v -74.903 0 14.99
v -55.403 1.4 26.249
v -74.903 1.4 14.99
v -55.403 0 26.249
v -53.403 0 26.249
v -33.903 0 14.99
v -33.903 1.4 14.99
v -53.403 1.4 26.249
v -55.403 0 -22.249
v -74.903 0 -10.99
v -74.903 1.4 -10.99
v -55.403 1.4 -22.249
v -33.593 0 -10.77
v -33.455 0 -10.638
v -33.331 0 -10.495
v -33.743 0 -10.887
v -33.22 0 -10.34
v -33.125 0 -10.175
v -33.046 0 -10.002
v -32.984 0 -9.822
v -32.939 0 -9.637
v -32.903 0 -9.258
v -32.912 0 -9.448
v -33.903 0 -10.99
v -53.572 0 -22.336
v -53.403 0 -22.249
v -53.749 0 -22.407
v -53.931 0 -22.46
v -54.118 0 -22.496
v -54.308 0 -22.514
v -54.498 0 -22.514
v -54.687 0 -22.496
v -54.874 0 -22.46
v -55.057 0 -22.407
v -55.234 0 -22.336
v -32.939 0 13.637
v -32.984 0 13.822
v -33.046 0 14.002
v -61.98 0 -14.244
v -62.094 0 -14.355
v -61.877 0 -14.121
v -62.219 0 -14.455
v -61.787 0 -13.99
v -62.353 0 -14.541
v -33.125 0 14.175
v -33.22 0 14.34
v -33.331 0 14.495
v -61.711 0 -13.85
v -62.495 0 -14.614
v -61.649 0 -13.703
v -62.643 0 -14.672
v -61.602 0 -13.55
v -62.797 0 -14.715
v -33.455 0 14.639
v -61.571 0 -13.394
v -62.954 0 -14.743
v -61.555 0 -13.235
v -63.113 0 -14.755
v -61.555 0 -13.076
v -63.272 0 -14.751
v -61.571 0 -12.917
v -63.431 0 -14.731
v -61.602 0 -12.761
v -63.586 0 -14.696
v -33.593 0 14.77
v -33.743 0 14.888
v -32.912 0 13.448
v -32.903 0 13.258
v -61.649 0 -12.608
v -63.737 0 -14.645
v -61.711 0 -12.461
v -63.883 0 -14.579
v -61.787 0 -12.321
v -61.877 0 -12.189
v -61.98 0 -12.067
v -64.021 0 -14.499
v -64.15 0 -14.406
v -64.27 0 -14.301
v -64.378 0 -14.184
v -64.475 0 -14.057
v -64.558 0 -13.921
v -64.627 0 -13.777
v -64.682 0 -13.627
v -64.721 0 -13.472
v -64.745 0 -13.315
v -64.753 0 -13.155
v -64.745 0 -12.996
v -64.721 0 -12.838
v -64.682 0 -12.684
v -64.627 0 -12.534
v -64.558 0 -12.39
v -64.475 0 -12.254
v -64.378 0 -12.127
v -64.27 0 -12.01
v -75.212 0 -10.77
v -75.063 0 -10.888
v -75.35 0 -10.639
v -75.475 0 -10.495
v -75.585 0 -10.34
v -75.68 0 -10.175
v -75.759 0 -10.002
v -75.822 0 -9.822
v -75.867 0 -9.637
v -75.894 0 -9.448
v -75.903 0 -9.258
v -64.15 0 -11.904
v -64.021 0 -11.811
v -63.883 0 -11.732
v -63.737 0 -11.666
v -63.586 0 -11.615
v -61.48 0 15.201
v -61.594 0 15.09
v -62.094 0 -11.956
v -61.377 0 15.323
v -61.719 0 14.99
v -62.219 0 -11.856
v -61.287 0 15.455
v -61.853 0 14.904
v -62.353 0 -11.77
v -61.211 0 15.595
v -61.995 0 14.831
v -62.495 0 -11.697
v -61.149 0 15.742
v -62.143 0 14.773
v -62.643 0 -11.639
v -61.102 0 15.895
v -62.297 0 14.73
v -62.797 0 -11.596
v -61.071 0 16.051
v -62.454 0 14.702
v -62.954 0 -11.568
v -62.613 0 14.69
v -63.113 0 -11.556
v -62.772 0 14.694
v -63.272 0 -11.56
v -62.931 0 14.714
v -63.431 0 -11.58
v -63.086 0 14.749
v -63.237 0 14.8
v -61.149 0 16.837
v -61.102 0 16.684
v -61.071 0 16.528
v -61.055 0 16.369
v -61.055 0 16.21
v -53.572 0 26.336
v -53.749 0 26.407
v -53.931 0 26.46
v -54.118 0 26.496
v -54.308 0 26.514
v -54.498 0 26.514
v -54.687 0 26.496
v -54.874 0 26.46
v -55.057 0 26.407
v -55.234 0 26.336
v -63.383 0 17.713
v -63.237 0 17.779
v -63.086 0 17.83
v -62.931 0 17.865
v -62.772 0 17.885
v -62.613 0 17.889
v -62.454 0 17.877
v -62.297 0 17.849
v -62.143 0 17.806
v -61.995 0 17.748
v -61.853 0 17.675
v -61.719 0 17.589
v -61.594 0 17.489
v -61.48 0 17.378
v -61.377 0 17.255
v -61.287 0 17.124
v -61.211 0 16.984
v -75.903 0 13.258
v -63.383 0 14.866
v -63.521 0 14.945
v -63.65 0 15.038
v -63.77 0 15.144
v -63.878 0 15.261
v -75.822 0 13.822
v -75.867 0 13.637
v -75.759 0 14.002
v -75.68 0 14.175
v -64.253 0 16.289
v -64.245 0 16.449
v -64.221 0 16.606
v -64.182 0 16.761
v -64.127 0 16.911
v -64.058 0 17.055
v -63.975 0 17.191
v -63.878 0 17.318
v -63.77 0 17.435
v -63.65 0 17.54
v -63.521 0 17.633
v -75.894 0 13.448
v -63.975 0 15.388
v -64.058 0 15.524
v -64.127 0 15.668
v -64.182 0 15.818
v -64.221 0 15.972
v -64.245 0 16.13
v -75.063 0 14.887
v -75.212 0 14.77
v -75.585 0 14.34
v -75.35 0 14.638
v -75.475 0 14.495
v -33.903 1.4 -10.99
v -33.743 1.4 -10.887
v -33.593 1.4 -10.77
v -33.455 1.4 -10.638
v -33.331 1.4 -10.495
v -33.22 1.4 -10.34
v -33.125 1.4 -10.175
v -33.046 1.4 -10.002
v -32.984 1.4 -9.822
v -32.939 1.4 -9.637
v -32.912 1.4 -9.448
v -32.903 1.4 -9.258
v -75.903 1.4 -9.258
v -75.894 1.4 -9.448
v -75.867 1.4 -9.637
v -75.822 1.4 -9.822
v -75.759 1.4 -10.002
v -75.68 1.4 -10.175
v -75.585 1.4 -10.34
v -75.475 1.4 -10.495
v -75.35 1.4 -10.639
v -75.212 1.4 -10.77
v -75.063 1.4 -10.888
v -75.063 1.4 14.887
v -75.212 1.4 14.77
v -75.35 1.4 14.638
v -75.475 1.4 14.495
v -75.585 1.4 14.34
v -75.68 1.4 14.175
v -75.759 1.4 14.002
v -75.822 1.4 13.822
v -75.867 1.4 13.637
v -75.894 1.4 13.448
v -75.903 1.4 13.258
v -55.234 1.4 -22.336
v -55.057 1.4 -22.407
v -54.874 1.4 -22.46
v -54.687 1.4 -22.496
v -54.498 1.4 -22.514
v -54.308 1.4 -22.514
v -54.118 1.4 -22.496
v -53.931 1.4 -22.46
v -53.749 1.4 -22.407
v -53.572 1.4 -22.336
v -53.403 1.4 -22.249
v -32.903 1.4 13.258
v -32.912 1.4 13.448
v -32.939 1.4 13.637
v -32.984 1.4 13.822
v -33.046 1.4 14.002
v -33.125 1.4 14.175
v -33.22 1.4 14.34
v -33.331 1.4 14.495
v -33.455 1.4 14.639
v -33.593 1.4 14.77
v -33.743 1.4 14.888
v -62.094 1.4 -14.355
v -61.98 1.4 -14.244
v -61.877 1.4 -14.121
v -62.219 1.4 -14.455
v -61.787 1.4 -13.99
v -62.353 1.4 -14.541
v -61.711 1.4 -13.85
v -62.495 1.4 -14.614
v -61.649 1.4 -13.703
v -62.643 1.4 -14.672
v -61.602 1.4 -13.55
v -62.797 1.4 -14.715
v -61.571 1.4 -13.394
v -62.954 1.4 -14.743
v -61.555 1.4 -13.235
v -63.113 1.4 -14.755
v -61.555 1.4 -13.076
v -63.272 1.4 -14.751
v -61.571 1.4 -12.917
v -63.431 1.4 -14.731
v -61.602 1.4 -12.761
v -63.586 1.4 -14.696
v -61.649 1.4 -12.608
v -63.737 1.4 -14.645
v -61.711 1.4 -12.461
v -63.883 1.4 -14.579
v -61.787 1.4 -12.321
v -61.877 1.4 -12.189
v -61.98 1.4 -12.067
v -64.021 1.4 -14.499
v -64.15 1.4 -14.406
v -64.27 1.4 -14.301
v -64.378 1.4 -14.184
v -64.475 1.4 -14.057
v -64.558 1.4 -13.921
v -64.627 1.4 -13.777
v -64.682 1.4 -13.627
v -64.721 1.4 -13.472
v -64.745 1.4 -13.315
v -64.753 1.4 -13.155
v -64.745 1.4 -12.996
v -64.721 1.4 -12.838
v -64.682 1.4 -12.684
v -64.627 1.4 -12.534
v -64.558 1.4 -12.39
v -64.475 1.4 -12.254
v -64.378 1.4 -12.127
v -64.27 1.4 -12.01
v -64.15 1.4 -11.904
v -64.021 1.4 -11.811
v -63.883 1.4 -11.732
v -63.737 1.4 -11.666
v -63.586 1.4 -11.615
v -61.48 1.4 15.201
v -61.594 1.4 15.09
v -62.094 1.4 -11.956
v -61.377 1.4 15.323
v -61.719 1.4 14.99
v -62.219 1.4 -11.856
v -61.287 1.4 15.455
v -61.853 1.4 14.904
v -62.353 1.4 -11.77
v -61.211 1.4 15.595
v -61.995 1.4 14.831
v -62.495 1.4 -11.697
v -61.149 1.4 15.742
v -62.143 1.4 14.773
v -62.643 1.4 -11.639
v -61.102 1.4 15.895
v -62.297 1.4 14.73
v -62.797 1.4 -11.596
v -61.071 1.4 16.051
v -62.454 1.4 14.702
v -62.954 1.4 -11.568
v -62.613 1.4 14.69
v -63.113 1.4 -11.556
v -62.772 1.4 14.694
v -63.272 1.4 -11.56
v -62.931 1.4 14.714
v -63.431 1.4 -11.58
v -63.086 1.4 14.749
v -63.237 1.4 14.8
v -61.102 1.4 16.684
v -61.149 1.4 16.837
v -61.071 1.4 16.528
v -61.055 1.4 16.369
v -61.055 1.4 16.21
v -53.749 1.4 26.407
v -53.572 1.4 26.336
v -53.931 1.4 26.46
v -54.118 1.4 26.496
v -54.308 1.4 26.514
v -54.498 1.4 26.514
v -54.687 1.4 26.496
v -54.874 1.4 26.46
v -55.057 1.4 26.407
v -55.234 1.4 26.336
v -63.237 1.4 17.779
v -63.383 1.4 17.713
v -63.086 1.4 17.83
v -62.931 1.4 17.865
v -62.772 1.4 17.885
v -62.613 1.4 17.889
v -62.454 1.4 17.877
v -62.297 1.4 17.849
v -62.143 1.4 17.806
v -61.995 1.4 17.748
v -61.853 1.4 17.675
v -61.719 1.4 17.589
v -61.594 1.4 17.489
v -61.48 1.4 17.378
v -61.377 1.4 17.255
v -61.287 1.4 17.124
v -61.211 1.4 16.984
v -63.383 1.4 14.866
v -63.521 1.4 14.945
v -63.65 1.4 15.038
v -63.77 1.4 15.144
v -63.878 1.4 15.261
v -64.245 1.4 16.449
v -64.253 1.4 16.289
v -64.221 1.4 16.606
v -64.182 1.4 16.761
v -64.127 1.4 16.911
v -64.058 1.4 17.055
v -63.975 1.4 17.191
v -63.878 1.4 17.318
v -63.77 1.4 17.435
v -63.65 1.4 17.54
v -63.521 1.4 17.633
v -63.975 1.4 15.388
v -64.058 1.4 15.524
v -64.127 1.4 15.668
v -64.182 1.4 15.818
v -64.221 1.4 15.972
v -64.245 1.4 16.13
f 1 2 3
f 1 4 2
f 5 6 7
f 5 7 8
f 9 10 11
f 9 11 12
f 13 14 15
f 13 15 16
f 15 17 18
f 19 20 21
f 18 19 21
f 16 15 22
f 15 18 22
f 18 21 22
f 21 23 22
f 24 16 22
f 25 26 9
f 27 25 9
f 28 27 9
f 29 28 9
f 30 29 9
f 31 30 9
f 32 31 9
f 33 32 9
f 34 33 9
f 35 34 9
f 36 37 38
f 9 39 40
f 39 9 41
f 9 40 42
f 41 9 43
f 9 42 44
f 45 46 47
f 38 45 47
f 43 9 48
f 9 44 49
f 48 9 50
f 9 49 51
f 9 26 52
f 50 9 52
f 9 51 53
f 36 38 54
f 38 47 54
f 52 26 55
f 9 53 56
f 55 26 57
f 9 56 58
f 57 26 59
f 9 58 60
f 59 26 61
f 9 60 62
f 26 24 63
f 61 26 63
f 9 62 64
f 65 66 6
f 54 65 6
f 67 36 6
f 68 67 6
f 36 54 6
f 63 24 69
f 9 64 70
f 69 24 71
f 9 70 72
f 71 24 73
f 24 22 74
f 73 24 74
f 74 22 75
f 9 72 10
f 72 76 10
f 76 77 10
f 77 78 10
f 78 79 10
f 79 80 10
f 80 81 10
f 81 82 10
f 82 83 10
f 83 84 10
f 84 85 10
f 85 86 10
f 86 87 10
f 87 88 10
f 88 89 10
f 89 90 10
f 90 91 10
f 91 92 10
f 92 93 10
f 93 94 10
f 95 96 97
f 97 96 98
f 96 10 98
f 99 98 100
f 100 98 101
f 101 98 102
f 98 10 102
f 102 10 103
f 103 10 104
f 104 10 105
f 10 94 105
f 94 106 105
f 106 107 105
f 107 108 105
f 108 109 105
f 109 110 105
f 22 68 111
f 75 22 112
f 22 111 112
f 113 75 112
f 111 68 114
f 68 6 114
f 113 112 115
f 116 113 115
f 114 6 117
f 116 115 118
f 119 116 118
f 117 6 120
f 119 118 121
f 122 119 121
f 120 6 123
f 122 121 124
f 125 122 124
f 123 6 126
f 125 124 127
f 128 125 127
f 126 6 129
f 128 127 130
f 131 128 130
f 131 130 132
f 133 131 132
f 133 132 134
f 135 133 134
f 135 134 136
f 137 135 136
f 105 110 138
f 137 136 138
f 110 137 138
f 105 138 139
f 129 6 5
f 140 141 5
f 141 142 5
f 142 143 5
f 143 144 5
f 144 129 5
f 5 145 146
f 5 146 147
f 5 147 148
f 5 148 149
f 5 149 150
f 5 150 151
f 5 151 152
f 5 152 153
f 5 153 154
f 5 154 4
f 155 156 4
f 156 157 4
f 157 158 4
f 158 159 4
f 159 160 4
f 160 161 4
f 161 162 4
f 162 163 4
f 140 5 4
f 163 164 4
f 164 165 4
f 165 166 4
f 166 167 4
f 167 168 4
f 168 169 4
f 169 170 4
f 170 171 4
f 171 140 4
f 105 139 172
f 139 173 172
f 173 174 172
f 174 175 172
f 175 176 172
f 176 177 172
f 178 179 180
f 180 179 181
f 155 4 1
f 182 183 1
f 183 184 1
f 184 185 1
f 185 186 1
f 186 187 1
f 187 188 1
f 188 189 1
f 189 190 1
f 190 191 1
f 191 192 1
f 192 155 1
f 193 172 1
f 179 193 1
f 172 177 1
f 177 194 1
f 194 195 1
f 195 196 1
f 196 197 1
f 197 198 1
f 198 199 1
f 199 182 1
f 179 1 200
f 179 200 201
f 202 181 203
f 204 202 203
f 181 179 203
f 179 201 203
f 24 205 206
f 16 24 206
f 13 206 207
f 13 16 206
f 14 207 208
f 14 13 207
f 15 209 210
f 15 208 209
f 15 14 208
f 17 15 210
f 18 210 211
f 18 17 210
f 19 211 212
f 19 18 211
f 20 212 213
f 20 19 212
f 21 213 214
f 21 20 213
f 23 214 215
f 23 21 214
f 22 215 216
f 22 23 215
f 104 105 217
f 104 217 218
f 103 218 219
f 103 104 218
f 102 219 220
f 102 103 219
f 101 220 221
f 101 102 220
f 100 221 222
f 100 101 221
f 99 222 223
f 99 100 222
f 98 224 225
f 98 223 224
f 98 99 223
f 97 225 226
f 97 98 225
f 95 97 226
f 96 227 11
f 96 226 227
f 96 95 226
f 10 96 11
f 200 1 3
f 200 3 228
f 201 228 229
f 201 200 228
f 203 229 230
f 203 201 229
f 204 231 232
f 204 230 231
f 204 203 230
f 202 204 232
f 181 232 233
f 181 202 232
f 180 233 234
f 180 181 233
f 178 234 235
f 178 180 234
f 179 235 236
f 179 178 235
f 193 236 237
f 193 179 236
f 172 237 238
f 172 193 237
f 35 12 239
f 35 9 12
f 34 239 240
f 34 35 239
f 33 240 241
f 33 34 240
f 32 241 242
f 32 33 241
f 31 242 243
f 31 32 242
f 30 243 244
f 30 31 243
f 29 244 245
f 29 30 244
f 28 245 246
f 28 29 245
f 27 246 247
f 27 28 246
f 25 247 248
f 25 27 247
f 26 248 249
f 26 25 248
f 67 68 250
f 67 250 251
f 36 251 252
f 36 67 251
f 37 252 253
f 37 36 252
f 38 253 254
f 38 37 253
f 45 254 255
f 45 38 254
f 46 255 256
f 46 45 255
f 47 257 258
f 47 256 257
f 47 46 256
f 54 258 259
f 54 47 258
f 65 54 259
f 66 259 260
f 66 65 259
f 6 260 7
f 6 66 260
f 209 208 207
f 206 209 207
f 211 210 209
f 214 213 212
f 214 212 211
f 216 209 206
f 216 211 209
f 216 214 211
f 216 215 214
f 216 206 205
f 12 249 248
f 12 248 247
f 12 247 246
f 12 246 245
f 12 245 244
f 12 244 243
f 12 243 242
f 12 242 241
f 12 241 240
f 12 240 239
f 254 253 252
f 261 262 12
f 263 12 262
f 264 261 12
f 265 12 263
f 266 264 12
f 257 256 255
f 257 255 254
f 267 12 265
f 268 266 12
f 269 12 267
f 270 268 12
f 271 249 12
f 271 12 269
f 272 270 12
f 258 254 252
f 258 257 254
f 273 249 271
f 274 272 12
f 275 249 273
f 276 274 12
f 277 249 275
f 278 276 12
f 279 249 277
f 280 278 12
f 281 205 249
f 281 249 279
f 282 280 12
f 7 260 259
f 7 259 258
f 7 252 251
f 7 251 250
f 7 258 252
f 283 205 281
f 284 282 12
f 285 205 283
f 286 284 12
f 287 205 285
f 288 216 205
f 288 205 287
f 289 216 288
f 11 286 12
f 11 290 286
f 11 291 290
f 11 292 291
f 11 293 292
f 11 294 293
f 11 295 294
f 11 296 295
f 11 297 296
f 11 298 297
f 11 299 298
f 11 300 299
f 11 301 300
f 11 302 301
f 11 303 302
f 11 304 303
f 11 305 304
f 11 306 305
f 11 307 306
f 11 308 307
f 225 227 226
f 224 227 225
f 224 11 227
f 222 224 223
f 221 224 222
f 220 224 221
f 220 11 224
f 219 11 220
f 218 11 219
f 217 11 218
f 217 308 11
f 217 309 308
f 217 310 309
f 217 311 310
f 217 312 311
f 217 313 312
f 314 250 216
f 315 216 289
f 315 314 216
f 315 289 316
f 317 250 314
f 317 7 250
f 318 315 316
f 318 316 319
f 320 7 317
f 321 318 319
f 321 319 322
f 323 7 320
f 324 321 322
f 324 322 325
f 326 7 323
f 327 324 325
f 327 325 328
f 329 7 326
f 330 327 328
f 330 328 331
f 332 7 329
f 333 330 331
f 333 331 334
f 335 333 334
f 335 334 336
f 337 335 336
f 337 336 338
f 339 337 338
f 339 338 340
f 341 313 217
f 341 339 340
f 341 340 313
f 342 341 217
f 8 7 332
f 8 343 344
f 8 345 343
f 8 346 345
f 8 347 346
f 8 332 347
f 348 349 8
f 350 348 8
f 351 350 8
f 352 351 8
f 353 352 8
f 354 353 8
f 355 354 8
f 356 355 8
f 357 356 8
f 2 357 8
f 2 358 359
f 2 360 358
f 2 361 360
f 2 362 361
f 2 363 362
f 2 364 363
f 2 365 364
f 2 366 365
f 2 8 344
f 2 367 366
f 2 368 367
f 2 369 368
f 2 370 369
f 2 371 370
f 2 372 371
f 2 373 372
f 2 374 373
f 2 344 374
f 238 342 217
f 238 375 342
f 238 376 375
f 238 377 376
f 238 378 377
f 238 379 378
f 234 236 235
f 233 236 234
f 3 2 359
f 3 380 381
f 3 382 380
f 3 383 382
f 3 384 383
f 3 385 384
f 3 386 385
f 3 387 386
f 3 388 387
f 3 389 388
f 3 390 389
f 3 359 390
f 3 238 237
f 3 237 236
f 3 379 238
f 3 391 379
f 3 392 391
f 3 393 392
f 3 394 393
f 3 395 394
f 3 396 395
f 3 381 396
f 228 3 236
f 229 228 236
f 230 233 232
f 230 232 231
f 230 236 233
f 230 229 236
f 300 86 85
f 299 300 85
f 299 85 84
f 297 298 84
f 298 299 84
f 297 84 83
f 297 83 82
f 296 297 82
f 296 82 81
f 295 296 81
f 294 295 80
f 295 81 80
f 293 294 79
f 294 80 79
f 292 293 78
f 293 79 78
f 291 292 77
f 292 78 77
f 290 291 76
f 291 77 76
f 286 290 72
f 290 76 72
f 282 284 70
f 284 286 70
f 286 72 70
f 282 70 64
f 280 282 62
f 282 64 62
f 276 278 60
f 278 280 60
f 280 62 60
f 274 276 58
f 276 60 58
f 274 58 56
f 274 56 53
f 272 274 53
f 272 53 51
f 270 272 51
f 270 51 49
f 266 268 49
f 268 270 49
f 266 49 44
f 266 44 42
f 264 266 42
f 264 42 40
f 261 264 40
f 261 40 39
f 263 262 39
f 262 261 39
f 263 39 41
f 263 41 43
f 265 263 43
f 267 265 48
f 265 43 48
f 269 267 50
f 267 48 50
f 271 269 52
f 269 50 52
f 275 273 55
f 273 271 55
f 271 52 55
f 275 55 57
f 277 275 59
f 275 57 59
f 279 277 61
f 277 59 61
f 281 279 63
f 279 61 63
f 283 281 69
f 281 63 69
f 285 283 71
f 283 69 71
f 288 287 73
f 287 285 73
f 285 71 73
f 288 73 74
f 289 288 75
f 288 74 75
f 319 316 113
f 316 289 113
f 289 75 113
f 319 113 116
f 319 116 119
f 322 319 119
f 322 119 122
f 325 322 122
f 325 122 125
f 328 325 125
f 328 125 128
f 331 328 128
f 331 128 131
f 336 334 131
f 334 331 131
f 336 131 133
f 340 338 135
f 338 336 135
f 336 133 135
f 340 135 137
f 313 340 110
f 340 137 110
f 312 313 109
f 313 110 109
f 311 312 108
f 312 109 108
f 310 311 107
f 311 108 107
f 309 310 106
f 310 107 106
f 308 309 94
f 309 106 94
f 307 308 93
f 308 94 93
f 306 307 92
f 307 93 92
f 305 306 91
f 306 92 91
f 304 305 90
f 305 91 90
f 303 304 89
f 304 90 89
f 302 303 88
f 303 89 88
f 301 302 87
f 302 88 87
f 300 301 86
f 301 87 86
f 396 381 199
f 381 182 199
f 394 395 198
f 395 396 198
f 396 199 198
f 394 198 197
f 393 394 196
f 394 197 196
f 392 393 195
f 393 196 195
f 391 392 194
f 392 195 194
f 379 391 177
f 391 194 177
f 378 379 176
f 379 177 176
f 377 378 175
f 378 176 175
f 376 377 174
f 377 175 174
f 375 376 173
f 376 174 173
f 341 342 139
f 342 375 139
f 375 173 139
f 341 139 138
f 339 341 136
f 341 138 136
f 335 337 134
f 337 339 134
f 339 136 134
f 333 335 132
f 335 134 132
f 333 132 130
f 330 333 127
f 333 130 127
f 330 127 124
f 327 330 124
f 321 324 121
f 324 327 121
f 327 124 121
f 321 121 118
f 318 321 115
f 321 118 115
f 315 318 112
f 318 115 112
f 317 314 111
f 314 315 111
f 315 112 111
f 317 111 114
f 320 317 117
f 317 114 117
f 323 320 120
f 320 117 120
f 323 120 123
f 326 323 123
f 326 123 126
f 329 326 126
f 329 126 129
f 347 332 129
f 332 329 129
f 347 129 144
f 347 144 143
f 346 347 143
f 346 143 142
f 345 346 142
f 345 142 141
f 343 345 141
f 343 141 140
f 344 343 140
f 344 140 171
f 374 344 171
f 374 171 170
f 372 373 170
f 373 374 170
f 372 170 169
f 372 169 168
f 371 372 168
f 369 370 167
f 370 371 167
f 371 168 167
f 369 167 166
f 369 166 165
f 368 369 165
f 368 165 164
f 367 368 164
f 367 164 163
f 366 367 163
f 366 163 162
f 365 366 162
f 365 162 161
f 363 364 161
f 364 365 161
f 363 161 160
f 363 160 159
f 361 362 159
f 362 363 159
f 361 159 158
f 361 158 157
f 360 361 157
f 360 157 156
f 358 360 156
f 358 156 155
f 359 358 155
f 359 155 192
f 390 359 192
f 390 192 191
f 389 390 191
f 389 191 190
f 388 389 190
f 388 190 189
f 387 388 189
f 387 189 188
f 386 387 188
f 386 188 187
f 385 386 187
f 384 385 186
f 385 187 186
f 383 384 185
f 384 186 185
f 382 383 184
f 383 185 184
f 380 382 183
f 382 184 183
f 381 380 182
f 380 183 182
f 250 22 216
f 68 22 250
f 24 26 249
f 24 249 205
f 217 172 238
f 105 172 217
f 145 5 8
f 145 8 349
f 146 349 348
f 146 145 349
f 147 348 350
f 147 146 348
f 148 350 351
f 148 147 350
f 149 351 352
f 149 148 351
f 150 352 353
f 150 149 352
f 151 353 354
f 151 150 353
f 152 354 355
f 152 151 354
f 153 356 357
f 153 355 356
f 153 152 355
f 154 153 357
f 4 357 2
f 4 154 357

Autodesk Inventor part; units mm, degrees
ref_plane "YZ Plane" through (0, 0, 0) normal (1, 0, 0) x (0, 1, 0)
ref_plane "XZ Plane" through (0, 0, 0) normal (0, 1, 0) x (-1, 0, 0)
ref_plane "XY Plane" through (0, 0, 0) normal (0, 0, 1) x (1, 0, 0)
sketch "Sketch1" plane through (0, 0, 0) normal (0, 1, 0) x (-1, 0, 0)
  line L0 (55.4027, 26.2487) -> (74.9027, 14.9904)
  line L1 (75.9027, 13.2583) -> (75.9027, -9.2583)
  line L2 (74.9027, -10.9904) -> (55.4027, -22.2487)
  line L3 (53.4027, -22.2487) -> (33.9027, -10.9904)
  line L4 (32.9027, -9.2583) -> (32.9027, 13.2583)
  line L5 (33.9027, 14.9904) -> (53.4027, 26.2487)
  arc A0 (33.9027, 14.9904) -> (32.9027, 13.2583) centre (34.9027, 13.2583) ccw
  arc A1 (32.9027, -9.2583) -> (33.9027, -10.9904) centre (34.9027, -9.2583) ccw
  arc A2 (53.4027, -22.2487) -> (55.4027, -22.2487) centre (54.4027, -20.5167) ccw
  arc A3 (74.9027, -10.9904) -> (75.9027, -9.2583) centre (73.9027, -9.2583) ccw
  arc A4 (75.9027, 13.2583) -> (74.9027, 14.9904) centre (73.9027, 13.2583) ccw
  arc A5 (55.4027, 26.2487) -> (53.4027, 26.2487) centre (54.4027, 24.5167) ccw
  circle A6 centre (63.1527, -13.1554) radius 1.6
  circle A7 centre (62.6527, 16.2894) radius 1.6
  point P0 (0, 0)
  point P1 (54.4027, 26.8261)
  point P2 (75.9027, 14.413)
  point P3 (75.9027, -10.413)
  point P4 (54.4027, -22.8261)
  point P5 (32.9027, -10.413)
  point P6 (32.9027, 14.413)
  dimension "d0" = 3.2
  dimension "d1" = 3.2
extrude "Extrusion1" add sketch "Sketch1" along normal blind 1.4
properties part number "Kicker PCB"
